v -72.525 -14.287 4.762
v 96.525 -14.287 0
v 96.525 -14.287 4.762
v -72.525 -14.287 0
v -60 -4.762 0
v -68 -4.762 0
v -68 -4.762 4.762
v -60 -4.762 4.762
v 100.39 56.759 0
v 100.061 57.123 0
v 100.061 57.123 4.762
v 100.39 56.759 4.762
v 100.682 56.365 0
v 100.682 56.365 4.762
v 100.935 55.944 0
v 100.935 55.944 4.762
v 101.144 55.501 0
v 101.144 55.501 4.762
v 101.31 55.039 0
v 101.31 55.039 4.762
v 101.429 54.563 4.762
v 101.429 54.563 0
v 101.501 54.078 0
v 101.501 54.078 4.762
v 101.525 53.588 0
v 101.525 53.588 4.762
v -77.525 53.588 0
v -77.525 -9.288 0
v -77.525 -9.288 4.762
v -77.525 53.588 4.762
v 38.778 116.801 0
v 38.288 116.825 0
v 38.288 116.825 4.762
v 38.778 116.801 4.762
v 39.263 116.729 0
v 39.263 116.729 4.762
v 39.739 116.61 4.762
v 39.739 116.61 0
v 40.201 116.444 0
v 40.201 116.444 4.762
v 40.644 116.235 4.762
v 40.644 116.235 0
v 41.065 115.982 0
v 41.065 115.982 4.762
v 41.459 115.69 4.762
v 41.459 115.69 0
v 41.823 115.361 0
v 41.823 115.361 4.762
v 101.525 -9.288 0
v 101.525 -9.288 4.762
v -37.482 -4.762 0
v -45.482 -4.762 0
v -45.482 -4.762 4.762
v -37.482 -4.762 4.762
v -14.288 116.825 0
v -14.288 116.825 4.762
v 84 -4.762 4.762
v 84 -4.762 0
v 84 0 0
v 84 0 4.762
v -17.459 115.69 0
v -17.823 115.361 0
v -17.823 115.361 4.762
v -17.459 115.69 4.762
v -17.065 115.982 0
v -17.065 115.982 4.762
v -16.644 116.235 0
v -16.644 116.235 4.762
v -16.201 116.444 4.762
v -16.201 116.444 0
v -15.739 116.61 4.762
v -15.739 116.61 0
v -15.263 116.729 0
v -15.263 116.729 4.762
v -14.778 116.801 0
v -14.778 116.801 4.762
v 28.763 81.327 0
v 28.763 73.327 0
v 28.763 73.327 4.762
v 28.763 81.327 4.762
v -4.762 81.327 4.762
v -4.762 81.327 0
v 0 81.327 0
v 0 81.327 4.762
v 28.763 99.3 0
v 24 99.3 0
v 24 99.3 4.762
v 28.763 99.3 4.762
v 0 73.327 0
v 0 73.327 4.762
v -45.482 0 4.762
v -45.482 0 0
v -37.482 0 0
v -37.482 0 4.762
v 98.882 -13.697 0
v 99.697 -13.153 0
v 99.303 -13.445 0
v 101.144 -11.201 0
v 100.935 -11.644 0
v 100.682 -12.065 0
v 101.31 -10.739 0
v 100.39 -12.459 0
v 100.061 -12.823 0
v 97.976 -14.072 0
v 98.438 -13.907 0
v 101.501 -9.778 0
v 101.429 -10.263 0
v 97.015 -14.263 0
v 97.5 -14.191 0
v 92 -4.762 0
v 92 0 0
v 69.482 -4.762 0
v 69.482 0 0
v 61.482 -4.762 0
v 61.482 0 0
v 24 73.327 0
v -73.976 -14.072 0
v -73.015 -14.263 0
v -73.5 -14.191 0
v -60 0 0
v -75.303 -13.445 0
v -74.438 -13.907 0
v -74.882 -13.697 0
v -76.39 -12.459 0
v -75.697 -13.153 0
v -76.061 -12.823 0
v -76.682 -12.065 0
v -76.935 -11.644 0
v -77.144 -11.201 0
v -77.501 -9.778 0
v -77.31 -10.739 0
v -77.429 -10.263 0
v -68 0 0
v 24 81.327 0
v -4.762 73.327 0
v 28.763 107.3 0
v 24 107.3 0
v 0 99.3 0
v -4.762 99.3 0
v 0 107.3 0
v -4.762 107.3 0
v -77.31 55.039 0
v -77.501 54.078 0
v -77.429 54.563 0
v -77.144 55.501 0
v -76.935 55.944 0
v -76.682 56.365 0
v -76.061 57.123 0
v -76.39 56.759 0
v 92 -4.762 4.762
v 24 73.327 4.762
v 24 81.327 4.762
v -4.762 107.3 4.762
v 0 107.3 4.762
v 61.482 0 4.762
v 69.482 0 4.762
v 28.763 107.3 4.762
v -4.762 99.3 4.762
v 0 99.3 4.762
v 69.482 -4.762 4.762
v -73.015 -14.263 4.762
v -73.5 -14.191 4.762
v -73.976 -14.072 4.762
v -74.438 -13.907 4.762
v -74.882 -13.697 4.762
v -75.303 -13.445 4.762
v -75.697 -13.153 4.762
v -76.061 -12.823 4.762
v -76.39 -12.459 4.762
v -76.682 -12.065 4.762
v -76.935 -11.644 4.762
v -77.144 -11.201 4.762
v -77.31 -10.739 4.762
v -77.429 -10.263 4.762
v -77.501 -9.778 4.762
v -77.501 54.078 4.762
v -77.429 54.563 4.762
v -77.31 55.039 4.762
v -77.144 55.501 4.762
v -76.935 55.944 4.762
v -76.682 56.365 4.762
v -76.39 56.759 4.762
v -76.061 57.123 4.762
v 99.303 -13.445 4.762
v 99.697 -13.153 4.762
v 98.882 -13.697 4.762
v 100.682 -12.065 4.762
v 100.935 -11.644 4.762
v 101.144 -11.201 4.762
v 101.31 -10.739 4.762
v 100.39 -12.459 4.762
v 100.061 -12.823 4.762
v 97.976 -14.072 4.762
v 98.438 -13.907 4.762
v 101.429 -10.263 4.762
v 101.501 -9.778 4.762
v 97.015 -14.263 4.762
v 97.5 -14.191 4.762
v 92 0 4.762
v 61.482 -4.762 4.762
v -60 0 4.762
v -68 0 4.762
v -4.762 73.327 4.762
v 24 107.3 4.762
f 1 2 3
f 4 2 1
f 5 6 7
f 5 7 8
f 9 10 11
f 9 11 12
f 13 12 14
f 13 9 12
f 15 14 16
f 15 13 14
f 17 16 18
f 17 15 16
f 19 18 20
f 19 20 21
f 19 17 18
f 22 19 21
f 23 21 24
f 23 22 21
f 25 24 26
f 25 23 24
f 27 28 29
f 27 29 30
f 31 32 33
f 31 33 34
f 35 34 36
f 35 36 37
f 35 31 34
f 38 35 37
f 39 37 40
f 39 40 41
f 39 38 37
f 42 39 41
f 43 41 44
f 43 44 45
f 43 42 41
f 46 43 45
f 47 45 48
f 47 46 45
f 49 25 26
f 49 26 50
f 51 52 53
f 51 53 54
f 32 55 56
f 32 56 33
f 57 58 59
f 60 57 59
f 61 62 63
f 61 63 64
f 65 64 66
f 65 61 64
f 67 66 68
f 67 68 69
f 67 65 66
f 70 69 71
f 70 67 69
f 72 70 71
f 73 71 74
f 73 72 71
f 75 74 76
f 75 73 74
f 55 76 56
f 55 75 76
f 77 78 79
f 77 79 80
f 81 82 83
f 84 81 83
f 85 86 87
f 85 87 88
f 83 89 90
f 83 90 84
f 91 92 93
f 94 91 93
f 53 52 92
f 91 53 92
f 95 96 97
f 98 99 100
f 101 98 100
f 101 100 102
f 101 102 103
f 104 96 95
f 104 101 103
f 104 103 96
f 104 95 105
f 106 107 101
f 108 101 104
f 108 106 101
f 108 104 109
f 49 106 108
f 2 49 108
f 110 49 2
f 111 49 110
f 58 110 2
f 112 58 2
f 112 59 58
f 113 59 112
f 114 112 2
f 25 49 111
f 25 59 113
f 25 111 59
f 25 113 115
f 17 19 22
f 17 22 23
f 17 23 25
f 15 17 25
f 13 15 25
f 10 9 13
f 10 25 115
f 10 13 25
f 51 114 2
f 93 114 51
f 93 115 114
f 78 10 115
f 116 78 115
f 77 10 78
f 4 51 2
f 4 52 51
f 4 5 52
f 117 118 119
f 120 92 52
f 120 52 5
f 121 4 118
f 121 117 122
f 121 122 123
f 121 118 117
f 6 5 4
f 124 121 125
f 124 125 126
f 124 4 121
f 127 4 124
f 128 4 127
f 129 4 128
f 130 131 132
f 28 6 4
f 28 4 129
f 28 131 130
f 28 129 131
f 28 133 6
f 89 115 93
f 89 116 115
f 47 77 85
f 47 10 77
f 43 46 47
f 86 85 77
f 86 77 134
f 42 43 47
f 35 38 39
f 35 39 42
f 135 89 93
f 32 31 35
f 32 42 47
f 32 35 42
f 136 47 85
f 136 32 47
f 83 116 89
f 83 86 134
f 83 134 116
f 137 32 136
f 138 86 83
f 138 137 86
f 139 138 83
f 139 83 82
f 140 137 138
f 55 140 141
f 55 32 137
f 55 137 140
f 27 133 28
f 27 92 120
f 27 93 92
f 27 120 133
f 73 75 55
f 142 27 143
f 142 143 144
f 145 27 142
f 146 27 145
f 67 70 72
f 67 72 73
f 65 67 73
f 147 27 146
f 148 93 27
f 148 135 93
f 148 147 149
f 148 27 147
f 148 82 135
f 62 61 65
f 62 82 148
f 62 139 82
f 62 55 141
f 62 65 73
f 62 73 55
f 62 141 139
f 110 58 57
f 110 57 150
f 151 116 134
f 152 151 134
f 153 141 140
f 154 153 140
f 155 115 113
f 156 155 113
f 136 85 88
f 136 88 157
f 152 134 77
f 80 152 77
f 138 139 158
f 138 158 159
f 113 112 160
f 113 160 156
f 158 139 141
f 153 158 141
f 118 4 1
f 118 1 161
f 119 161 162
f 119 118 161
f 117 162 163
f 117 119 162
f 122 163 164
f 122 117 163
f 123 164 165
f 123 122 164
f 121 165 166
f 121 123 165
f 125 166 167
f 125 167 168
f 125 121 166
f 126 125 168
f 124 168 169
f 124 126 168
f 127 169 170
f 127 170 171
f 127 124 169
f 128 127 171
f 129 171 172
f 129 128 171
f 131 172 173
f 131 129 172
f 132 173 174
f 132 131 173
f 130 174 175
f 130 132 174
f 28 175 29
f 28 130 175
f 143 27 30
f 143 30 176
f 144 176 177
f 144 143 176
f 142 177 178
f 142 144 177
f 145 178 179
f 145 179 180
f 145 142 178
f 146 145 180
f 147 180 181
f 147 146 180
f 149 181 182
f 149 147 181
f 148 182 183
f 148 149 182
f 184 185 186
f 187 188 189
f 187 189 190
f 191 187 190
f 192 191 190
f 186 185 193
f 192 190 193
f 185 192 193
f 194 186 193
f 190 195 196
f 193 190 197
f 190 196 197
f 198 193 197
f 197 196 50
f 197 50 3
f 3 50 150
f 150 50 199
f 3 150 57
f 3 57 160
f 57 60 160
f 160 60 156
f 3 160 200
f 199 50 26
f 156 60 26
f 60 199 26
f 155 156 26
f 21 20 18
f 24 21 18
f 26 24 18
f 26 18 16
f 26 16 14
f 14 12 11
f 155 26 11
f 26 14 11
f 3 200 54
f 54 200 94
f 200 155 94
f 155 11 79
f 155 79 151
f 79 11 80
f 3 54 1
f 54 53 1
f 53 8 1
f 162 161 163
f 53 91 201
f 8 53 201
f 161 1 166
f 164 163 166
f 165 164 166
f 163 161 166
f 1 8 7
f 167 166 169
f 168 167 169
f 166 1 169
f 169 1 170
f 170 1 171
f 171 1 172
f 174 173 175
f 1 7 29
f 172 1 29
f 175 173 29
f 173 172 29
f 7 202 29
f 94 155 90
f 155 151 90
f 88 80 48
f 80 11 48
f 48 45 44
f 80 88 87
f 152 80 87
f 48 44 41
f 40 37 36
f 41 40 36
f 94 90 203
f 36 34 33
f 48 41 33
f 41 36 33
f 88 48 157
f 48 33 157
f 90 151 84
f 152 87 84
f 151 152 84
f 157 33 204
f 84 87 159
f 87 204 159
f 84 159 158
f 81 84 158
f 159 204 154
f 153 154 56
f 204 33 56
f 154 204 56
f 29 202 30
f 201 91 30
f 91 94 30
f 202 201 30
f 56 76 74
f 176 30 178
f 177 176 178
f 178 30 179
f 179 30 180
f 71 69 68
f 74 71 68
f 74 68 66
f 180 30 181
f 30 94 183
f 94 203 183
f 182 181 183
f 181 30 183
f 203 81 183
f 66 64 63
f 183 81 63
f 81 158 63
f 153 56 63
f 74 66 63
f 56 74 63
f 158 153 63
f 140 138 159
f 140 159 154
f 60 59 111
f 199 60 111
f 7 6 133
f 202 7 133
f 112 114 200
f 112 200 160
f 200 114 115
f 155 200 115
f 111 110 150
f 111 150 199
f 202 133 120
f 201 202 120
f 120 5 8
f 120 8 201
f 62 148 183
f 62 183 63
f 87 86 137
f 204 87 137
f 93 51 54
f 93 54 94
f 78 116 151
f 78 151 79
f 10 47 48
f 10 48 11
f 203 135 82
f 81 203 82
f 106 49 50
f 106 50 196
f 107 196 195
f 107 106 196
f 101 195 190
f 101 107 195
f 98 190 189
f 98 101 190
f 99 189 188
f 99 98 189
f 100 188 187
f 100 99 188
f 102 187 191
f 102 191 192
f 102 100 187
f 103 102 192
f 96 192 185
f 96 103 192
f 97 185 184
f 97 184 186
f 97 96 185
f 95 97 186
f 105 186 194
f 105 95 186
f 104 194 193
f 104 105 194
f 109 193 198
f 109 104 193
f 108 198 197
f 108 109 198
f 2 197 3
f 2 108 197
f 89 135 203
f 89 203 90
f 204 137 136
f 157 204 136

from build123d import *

# Parameters (mm, degrees)
SKETCH1_W           = 8
SKETCH1_H           = 4.7625
SKETCH1_W_2         = 4.7625
SKETCH1_H_2         = 8
BOSS_EXTRUDE1_DEPTH = 4.7625


with BuildPart() as part:
    # Sketch1 → Boss-Extrude1 (new body)
    with BuildSketch(Plane.XY):
        with BuildLine():
            Line((-17.823033906, 115.360533906), (-76.060533906, 57.123033906))
            ThreePointArc((-76.060533906, 57.123033906), (-77.144397663, 55.500917162), (-77.525, 53.5875))
            Line((-77.525, 53.5875), (-77.525, -9.2875))
            ThreePointArc((-77.525, -9.2875), (-76.060533906, -12.823033906), (-72.525, -14.2875))
            Line((-72.525, -14.2875), (96.525, -14.2875))
            ThreePointArc((96.525, -14.2875), (100.060533906, -12.823033906), (101.525, -9.2875))
            Line((101.525, -9.2875), (101.525, 53.5875))
            ThreePointArc((101.525, 53.5875), (101.144397663, 55.500917162), (100.060533906, 57.123033906))
            Line((100.060533906, 57.123033906), (41.823033906, 115.360533906))
            ThreePointArc((41.823033906, 115.360533906), (40.200917162, 116.444397663), (38.2875, 116.825))
            Line((38.2875, 116.825), (-14.2875, 116.825))
            ThreePointArc((-14.2875, 116.825), (-16.200917162, 116.444397663), (-17.823033906, 115.360533906))
        make_face()
        with Locations((-64, -2.38125)):
            Rectangle(SKETCH1_W, SKETCH1_H, mode=Mode.SUBTRACT)
        with Locations((-41.481563848, -2.38125)):
            Rectangle(SKETCH1_W, SKETCH1_H, mode=Mode.SUBTRACT)
        with Locations((65.481563848, -2.38125)):
            Rectangle(SKETCH1_W, SKETCH1_H, mode=Mode.SUBTRACT)
        with Locations((88, -2.38125)):
            Rectangle(SKETCH1_W, SKETCH1_H, mode=Mode.SUBTRACT)
        with Locations((-2.38125, 77.326723172)):
            Rectangle(SKETCH1_W_2, SKETCH1_H_2, mode=Mode.SUBTRACT)
        with Locations((-2.38125, 103.3)):
            Rectangle(SKETCH1_W_2, SKETCH1_H_2, mode=Mode.SUBTRACT)
        with Locations((26.38125, 77.326723172)):
            Rectangle(SKETCH1_W_2, SKETCH1_H_2, mode=Mode.SUBTRACT)
        with Locations((26.38125, 103.3)):
            Rectangle(SKETCH1_W_2, SKETCH1_H_2, mode=Mode.SUBTRACT)
    extrude(amount=BOSS_EXTRUDE1_DEPTH)


solid = part.part
